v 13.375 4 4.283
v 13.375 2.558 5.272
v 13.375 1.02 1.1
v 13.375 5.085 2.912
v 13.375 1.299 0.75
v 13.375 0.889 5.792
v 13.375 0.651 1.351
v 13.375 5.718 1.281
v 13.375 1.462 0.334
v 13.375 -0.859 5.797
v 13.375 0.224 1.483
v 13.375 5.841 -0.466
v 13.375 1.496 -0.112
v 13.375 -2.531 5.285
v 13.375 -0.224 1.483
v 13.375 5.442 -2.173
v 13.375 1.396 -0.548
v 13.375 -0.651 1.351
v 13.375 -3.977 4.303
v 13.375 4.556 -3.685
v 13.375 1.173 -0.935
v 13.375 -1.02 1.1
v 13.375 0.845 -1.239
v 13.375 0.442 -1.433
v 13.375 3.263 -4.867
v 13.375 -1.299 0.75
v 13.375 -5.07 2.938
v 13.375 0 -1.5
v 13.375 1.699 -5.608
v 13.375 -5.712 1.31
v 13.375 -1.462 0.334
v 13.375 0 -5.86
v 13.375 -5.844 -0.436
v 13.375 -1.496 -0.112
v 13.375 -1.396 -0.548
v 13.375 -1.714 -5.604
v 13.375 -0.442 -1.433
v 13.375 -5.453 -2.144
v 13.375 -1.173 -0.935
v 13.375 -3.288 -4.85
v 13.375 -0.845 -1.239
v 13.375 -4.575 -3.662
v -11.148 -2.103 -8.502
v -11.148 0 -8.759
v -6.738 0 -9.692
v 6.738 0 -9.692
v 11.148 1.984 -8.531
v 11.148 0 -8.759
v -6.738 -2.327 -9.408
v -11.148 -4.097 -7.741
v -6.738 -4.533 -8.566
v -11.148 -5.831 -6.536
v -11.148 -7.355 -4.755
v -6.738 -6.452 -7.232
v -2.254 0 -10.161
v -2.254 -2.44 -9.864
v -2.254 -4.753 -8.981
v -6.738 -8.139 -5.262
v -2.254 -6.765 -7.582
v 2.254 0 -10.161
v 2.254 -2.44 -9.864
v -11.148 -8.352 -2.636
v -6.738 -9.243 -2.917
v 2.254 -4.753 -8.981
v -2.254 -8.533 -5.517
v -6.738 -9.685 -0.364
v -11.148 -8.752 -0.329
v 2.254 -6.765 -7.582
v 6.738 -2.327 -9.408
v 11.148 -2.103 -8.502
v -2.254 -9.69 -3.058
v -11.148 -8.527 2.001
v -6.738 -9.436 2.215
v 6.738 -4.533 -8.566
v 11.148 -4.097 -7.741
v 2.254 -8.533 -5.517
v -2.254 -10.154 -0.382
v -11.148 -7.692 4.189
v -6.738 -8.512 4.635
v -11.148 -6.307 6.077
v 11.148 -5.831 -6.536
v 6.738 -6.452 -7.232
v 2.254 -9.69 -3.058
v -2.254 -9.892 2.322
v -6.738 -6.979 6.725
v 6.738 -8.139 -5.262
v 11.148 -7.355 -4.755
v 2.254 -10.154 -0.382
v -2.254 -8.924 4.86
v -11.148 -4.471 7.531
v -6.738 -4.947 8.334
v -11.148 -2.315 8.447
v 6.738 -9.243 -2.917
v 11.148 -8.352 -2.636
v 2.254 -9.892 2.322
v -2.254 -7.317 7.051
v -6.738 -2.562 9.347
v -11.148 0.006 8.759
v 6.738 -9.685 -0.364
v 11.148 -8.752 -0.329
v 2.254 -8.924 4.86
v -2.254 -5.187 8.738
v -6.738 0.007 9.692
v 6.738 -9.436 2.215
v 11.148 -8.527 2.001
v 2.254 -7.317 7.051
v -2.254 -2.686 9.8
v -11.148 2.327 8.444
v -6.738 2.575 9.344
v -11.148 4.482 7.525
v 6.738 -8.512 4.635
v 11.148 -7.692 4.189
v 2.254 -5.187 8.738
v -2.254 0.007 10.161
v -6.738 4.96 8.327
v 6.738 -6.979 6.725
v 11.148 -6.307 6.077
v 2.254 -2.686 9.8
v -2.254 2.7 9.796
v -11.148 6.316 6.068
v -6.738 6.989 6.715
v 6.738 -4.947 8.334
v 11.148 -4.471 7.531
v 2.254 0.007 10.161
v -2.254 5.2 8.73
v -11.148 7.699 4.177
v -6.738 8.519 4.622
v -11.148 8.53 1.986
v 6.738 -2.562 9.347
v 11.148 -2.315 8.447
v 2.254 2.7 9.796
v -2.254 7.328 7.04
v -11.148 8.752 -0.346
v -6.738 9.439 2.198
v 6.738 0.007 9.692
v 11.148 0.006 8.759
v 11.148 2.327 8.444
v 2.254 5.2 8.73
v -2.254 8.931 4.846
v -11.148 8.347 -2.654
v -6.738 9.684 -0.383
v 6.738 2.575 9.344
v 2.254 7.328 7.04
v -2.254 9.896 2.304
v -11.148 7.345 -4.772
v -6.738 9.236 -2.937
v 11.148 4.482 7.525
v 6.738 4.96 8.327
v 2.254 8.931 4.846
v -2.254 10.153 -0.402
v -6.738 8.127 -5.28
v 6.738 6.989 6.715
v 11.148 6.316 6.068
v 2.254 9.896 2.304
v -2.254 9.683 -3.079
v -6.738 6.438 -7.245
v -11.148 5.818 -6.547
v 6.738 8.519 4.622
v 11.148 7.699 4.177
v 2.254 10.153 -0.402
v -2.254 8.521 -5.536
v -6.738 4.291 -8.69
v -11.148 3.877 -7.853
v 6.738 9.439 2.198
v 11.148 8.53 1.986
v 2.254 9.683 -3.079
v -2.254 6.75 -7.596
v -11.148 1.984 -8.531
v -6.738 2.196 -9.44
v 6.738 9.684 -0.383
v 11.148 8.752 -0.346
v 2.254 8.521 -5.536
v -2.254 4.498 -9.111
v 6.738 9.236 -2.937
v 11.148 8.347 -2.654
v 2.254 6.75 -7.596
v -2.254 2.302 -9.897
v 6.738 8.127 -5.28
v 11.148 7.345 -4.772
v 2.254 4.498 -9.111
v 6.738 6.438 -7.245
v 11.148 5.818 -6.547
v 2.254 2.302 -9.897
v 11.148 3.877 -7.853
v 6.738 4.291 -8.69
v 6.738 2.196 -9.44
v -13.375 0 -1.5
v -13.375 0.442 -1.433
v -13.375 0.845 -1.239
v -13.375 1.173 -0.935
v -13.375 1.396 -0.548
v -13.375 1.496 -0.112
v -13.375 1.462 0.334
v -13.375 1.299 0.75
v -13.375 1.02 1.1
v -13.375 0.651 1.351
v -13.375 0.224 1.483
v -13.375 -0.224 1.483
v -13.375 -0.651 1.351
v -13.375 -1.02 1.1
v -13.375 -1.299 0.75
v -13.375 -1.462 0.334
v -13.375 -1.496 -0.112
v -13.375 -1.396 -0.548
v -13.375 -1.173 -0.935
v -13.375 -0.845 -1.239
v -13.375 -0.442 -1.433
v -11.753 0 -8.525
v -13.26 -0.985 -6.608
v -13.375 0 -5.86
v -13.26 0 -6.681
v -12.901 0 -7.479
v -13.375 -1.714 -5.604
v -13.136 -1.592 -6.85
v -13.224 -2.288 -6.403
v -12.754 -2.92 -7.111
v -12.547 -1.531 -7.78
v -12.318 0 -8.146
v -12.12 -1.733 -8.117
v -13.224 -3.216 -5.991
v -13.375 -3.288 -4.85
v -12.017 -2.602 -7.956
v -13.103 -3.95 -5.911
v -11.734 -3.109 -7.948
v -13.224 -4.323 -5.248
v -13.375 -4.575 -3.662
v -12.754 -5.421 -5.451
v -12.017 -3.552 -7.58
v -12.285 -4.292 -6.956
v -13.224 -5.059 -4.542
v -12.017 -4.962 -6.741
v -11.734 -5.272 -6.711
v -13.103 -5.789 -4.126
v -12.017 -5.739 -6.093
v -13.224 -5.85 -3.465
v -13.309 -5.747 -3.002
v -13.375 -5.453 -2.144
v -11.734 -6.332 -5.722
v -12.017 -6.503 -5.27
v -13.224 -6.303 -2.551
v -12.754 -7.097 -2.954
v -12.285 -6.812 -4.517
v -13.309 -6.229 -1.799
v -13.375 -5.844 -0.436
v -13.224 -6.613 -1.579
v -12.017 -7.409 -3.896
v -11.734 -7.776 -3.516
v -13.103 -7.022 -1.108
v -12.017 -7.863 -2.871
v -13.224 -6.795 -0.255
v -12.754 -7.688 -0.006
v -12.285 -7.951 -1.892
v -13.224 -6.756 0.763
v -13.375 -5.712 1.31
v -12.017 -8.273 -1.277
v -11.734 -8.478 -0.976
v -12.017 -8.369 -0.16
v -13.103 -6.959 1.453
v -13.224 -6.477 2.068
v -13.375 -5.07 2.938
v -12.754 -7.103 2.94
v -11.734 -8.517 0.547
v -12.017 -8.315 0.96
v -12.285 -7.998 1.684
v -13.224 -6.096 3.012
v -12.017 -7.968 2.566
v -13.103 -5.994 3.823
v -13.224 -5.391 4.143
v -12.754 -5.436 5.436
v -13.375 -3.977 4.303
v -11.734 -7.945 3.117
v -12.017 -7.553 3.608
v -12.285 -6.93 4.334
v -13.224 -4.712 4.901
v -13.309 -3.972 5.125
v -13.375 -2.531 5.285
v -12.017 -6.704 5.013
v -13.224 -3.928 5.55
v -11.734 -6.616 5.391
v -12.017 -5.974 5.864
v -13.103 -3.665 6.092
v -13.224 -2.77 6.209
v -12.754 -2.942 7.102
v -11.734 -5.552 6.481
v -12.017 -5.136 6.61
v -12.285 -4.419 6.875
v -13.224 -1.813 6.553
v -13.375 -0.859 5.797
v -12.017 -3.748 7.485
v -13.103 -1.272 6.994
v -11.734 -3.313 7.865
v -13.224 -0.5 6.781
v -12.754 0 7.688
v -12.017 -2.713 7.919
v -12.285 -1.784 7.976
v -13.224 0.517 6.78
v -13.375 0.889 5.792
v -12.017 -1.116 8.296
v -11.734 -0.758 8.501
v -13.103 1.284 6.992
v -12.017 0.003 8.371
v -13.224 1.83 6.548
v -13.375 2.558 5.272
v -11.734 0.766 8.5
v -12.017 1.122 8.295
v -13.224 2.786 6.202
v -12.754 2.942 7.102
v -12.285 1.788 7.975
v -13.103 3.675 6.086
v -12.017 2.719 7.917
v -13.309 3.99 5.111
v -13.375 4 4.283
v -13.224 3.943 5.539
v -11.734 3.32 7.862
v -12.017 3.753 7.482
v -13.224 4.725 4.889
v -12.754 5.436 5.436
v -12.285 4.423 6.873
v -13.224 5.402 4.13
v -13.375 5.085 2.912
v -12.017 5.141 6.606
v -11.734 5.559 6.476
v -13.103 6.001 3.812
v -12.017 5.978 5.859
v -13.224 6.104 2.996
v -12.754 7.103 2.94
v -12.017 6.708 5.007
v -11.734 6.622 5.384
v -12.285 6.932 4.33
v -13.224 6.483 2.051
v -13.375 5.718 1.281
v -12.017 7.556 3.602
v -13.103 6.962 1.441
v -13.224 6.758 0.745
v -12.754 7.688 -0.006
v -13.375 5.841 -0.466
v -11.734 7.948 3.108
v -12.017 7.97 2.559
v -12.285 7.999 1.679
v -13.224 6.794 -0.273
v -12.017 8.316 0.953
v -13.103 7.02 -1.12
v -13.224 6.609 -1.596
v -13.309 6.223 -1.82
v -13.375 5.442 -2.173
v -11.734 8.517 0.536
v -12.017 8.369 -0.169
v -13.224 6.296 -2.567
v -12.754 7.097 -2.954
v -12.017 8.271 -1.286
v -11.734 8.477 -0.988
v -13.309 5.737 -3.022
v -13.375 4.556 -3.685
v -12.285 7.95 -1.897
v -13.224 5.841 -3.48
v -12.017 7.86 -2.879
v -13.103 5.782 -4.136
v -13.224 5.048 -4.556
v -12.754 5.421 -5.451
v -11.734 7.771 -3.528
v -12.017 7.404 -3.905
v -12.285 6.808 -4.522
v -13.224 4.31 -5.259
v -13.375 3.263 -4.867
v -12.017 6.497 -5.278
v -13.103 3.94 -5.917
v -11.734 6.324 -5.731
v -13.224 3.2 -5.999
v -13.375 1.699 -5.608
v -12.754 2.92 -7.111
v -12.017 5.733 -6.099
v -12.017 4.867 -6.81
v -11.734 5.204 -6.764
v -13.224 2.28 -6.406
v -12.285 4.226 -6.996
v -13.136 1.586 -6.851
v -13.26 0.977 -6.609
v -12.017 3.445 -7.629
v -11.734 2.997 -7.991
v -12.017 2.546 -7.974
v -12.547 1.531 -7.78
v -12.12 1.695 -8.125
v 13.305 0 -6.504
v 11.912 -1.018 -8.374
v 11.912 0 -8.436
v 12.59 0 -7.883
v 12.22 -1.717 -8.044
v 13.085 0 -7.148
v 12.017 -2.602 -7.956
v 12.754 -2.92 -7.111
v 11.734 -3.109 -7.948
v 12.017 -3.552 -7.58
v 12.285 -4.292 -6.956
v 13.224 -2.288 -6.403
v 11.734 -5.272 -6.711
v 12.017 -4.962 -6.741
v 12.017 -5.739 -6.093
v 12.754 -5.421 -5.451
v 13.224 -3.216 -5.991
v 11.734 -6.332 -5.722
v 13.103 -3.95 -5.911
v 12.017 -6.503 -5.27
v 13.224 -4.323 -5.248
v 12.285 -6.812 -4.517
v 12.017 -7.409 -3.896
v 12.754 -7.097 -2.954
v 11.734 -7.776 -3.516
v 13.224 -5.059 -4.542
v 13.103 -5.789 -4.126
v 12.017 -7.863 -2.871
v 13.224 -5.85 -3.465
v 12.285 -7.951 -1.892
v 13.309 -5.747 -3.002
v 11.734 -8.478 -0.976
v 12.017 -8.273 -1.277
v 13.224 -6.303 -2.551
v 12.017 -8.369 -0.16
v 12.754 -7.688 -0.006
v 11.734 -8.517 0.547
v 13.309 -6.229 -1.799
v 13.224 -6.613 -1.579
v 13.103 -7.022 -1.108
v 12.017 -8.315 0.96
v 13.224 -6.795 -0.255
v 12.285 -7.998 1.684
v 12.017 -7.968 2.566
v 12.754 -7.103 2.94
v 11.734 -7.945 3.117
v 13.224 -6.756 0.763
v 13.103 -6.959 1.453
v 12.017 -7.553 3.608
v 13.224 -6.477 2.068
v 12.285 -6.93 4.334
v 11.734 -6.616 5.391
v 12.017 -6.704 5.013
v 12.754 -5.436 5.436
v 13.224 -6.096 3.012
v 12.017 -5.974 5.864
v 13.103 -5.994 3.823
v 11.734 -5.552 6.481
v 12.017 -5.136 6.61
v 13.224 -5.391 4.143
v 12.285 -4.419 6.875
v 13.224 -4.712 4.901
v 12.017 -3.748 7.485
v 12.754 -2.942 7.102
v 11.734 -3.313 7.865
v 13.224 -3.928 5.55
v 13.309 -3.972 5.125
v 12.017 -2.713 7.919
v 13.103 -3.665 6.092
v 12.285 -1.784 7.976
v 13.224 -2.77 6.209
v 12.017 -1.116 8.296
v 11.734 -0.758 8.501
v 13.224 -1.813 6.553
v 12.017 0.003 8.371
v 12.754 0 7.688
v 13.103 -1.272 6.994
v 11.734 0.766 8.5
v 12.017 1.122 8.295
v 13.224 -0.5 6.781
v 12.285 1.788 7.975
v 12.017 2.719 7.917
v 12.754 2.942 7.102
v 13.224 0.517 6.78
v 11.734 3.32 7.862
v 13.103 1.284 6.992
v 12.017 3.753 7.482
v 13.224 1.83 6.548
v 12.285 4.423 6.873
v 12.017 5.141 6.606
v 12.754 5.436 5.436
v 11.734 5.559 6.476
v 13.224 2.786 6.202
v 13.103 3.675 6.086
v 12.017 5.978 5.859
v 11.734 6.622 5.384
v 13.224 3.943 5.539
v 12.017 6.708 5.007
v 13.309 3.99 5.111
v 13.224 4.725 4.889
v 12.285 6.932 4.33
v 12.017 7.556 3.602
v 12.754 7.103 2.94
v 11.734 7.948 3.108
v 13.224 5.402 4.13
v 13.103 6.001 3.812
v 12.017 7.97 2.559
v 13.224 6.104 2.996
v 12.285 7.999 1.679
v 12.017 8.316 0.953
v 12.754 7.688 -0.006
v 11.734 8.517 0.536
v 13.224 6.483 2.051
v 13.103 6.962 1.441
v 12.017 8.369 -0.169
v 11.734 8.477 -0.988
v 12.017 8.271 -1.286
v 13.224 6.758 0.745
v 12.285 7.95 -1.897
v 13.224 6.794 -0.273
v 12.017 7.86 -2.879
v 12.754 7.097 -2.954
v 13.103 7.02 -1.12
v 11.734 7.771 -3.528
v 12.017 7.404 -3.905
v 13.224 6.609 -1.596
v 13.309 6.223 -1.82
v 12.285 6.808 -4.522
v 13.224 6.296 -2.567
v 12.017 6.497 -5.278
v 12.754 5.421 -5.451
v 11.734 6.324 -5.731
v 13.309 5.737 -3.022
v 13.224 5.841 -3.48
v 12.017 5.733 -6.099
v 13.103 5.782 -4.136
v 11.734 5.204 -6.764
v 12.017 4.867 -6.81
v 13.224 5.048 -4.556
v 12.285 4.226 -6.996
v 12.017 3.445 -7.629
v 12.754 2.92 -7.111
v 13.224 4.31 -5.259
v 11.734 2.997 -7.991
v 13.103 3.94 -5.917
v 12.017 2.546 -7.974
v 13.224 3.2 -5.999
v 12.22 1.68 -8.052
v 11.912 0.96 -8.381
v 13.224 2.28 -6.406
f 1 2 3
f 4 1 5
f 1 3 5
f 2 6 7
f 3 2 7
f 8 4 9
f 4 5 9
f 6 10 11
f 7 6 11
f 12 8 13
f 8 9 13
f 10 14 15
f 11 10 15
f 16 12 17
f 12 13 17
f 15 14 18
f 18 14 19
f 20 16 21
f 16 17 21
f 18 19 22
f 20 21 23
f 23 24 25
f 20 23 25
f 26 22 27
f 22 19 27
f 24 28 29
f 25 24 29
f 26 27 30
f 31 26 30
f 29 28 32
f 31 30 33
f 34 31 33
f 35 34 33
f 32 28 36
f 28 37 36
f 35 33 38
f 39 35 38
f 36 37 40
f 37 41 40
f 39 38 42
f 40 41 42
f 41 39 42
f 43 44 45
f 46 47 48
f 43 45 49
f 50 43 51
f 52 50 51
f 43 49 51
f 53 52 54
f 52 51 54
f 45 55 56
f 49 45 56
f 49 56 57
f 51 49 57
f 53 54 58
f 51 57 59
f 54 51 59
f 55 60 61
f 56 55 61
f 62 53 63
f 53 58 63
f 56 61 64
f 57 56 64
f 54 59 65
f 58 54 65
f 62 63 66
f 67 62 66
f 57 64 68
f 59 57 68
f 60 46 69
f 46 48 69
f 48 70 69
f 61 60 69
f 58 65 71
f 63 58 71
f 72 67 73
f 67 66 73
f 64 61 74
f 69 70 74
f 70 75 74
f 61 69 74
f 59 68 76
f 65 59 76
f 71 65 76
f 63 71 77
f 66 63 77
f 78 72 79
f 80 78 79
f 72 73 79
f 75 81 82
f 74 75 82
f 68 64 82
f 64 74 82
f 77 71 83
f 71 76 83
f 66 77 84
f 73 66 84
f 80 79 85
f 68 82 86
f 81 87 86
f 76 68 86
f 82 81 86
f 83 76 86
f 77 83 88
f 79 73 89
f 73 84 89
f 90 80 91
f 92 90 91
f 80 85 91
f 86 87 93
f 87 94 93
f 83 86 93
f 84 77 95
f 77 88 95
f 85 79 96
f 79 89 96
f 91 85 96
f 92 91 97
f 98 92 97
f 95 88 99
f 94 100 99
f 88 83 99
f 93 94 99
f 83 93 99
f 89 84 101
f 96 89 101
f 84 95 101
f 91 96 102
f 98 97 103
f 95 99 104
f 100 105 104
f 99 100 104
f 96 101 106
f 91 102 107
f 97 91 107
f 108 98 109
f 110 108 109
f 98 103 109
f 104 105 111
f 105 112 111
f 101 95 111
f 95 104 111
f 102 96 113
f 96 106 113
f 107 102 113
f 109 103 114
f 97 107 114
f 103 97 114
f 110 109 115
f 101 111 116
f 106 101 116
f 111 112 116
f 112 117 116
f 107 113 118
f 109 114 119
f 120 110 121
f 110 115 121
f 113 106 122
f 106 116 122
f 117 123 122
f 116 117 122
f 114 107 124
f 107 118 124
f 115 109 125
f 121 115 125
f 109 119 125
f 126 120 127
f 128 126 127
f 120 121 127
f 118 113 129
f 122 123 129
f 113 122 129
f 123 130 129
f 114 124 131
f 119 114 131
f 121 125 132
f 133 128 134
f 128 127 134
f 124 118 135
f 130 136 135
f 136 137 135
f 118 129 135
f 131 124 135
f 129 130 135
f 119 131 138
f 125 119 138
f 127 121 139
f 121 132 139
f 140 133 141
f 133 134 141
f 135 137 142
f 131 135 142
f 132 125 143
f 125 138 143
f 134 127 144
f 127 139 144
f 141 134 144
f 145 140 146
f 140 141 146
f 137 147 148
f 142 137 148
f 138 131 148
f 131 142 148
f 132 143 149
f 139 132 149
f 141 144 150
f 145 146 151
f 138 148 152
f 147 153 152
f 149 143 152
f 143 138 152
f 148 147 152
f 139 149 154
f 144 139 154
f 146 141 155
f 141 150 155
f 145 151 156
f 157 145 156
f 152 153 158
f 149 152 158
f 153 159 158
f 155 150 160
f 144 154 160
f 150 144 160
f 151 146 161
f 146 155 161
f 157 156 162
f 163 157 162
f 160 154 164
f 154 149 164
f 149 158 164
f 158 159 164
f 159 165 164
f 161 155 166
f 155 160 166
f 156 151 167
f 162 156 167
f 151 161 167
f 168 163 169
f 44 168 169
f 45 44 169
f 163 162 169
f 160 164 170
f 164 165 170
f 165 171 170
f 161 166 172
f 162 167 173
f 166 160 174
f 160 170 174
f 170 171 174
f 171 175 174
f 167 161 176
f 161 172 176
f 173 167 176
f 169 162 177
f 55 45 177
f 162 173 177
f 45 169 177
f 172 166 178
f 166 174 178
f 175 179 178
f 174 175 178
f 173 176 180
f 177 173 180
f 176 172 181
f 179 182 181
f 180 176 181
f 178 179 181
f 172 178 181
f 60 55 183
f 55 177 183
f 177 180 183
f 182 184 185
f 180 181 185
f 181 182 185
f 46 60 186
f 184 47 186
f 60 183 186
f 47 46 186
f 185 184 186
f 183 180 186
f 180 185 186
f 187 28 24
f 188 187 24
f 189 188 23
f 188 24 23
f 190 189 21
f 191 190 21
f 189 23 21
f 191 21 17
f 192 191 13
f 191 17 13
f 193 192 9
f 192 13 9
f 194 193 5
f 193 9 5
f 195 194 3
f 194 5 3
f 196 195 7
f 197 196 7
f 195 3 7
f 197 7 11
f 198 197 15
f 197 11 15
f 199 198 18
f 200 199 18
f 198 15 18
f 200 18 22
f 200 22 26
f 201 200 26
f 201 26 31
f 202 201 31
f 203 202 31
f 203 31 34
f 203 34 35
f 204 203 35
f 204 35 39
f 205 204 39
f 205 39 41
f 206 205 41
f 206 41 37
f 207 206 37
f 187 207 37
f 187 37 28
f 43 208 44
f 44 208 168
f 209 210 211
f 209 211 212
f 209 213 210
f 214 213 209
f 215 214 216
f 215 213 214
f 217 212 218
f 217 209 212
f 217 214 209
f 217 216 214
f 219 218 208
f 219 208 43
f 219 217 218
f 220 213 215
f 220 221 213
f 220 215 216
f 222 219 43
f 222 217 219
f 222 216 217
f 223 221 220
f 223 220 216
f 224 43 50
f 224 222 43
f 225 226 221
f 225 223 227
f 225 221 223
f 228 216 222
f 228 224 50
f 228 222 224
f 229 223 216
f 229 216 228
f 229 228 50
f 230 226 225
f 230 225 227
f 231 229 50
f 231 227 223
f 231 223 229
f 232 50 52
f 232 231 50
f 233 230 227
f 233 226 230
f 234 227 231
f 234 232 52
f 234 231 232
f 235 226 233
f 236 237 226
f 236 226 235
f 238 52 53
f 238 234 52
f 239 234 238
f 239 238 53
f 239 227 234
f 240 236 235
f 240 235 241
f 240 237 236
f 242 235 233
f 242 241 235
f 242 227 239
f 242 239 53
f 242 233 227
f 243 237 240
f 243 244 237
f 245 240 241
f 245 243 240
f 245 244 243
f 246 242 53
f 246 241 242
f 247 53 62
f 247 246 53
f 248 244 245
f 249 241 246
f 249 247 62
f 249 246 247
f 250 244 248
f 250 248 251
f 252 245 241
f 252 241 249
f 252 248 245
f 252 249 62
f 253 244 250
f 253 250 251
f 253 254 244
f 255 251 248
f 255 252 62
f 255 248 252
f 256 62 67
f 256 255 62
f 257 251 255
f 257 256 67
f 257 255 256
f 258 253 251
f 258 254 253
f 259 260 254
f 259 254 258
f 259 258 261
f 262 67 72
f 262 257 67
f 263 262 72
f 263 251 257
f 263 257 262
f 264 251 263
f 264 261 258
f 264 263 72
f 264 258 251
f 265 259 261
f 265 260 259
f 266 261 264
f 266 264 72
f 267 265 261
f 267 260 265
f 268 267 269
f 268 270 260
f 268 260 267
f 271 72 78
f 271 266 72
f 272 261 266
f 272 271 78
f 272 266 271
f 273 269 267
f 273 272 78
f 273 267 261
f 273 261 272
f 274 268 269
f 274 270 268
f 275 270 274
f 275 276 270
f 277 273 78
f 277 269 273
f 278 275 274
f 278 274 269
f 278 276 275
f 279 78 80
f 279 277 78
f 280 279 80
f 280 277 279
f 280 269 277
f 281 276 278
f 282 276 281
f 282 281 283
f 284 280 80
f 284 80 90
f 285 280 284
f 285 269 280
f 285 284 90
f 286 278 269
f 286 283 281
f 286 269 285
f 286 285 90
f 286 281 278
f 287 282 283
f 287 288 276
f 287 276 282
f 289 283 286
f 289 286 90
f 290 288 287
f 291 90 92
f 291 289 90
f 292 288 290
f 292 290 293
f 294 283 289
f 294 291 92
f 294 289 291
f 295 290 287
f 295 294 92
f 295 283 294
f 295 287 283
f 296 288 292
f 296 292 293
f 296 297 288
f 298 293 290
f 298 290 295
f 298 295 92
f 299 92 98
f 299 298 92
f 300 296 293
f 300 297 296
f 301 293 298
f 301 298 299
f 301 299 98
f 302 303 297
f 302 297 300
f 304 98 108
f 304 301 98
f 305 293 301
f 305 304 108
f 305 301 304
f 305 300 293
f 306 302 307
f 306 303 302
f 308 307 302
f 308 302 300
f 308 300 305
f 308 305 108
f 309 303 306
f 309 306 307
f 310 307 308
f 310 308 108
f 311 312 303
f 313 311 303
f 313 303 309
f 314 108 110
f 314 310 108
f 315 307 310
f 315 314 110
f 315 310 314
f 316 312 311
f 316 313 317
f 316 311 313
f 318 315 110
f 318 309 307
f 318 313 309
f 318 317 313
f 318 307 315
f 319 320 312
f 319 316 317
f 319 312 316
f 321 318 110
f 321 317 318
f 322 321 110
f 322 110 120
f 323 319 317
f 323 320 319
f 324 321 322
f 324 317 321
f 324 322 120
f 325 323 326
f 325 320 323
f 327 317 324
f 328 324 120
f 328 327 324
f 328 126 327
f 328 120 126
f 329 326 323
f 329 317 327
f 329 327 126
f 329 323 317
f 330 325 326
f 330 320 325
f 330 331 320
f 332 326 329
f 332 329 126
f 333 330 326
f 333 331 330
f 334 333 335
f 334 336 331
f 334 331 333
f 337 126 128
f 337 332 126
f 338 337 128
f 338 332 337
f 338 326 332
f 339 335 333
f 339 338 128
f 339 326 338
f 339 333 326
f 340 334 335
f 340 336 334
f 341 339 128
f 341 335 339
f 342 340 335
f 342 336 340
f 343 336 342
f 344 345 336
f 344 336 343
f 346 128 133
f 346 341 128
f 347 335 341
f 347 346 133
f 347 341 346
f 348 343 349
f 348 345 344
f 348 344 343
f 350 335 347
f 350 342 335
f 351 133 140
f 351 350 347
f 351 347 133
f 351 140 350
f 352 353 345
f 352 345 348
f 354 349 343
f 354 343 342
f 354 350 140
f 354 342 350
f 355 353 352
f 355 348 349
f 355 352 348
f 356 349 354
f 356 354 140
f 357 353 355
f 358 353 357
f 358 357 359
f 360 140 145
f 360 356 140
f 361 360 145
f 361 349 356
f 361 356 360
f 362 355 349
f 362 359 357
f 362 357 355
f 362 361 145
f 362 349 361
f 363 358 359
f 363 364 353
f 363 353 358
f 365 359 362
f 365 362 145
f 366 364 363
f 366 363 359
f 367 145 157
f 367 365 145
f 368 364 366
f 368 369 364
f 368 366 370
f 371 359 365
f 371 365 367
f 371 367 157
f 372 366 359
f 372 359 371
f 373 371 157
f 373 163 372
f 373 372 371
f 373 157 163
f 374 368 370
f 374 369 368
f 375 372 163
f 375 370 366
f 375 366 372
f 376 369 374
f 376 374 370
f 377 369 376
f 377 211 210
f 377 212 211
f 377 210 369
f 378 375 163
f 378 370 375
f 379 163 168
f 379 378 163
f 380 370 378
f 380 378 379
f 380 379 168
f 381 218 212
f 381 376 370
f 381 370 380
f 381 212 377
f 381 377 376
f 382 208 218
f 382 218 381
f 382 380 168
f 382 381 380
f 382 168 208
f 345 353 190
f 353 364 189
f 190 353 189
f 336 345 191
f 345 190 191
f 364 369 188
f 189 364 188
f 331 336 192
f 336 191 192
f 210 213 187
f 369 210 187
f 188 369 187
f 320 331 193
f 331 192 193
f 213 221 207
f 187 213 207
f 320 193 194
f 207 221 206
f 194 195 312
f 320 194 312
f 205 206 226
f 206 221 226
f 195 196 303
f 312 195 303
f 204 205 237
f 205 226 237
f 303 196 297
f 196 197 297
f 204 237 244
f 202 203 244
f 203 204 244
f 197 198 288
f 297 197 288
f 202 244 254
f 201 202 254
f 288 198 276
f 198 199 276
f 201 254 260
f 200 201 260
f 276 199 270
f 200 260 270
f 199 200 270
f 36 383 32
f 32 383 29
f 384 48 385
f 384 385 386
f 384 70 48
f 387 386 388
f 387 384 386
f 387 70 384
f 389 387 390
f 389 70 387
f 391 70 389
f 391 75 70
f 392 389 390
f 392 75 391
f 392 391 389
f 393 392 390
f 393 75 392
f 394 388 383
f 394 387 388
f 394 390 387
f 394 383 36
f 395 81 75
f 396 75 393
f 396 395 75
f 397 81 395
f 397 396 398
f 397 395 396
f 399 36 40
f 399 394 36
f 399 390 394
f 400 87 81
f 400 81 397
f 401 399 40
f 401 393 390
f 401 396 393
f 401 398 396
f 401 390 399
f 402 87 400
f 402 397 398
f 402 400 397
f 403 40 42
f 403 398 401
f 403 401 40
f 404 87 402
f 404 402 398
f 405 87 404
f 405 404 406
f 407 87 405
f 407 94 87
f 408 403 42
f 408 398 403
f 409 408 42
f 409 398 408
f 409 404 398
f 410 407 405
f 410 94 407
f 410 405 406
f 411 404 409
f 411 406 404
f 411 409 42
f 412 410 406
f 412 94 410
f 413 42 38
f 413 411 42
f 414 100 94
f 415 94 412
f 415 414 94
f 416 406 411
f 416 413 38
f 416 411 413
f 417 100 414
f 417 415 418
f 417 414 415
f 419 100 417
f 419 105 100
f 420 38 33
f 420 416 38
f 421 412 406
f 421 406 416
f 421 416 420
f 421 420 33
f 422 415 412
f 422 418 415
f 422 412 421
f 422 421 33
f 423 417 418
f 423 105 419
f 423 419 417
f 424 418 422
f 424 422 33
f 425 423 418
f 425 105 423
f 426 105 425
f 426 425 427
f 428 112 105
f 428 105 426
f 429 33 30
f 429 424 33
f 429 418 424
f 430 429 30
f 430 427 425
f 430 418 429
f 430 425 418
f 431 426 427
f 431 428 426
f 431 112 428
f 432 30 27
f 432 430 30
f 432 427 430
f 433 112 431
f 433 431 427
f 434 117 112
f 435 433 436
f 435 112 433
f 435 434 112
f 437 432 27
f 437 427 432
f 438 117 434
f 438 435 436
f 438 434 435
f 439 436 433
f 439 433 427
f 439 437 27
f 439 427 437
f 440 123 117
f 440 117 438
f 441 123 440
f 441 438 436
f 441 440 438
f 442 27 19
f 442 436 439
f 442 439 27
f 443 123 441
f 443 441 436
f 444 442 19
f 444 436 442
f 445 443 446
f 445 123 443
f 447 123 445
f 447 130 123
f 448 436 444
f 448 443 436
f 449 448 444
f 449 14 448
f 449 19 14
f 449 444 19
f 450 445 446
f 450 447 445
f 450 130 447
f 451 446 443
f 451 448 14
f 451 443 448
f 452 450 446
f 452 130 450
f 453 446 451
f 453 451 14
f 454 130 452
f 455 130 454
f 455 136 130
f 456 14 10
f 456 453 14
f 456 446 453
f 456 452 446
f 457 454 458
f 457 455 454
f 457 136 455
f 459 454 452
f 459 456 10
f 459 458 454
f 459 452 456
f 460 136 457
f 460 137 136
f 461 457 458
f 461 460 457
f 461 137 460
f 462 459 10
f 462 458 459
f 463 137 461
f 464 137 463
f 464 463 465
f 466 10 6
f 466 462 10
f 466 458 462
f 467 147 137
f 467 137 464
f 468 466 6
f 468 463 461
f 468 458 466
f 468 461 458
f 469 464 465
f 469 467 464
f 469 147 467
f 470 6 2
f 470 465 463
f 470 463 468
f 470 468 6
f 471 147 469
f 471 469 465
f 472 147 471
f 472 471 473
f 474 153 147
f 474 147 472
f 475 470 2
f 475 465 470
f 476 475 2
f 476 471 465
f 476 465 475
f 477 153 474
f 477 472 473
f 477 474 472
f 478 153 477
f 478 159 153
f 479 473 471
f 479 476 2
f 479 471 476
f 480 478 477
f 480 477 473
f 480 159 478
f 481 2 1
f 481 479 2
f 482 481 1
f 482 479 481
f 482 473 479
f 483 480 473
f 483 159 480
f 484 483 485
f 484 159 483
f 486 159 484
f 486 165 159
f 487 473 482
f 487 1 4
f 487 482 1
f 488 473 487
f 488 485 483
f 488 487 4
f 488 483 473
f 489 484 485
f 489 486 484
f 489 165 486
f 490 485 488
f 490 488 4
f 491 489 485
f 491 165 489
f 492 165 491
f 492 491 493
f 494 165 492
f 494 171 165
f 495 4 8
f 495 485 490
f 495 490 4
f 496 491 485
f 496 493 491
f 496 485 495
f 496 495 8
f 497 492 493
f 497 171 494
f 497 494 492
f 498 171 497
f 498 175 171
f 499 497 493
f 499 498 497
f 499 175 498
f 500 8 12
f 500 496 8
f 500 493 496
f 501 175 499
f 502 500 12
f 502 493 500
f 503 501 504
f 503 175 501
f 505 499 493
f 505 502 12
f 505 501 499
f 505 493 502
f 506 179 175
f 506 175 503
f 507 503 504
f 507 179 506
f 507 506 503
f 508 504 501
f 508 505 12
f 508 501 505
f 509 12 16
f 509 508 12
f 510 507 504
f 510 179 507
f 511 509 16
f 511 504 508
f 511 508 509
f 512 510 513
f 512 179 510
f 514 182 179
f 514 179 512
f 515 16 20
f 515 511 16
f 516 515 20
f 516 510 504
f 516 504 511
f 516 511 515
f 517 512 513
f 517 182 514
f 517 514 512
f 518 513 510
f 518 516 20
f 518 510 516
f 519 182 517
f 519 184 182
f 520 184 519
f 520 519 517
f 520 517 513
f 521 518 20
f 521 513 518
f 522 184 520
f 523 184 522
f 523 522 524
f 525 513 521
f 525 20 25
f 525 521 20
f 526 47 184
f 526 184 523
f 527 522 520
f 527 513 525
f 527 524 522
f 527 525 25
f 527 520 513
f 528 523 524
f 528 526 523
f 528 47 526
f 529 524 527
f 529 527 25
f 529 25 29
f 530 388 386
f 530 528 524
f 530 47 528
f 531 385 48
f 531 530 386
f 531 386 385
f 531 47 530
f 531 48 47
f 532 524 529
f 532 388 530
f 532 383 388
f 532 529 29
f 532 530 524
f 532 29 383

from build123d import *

# Parameters (mm, degrees)
CONG_1_R                = 3
ESQUISSE2_R             = 1.5
ENL_V_MAT_EXTRU_1_DEPTH = 31.404922454


with BuildPart() as part:
    # Esquisse1 → Révolution1 (revolve)
    with BuildSketch(Plane.XY, mode=Mode.PRIVATE) as r_volution1_sk:
        with BuildLine():
            Line((-13.375, 0), (-13.375, 8.1))
            ThreePointArc((-13.375, 8.1), (0, 10.22), (13.375, 8.1))
            Line((13.375, 8.1), (13.375, 0))
            Line((13.375, 0), (-13.375, 0))
        make_face()
    revolve(r_volution1_sk.sketch.rotate(Axis((0, 0, 0), (-1, 0, 0)), 90), axis=Axis((0, 0, 0), (-1, 0, 0)))

    # Congé1
    cong_1_edges = [part.edges().sort_by_distance(p)[0] for p in [
        (-13.375, 0, 8.1),
        (13.375, 0, 8.1),
    ]]
    fillet(cong_1_edges, radius=CONG_1_R)

    # Esquisse2 → Enlèv. mat.-Extru.1 (cut, through all)
    with BuildSketch(Plane(origin=(13.375, 0, 0), x_dir=(0, 0, -1), z_dir=(1, 0, 0))):
        Circle(ESQUISSE2_R)
    extrude(amount=-ENL_V_MAT_EXTRU_1_DEPTH, mode=Mode.SUBTRACT)


solid = part.part
